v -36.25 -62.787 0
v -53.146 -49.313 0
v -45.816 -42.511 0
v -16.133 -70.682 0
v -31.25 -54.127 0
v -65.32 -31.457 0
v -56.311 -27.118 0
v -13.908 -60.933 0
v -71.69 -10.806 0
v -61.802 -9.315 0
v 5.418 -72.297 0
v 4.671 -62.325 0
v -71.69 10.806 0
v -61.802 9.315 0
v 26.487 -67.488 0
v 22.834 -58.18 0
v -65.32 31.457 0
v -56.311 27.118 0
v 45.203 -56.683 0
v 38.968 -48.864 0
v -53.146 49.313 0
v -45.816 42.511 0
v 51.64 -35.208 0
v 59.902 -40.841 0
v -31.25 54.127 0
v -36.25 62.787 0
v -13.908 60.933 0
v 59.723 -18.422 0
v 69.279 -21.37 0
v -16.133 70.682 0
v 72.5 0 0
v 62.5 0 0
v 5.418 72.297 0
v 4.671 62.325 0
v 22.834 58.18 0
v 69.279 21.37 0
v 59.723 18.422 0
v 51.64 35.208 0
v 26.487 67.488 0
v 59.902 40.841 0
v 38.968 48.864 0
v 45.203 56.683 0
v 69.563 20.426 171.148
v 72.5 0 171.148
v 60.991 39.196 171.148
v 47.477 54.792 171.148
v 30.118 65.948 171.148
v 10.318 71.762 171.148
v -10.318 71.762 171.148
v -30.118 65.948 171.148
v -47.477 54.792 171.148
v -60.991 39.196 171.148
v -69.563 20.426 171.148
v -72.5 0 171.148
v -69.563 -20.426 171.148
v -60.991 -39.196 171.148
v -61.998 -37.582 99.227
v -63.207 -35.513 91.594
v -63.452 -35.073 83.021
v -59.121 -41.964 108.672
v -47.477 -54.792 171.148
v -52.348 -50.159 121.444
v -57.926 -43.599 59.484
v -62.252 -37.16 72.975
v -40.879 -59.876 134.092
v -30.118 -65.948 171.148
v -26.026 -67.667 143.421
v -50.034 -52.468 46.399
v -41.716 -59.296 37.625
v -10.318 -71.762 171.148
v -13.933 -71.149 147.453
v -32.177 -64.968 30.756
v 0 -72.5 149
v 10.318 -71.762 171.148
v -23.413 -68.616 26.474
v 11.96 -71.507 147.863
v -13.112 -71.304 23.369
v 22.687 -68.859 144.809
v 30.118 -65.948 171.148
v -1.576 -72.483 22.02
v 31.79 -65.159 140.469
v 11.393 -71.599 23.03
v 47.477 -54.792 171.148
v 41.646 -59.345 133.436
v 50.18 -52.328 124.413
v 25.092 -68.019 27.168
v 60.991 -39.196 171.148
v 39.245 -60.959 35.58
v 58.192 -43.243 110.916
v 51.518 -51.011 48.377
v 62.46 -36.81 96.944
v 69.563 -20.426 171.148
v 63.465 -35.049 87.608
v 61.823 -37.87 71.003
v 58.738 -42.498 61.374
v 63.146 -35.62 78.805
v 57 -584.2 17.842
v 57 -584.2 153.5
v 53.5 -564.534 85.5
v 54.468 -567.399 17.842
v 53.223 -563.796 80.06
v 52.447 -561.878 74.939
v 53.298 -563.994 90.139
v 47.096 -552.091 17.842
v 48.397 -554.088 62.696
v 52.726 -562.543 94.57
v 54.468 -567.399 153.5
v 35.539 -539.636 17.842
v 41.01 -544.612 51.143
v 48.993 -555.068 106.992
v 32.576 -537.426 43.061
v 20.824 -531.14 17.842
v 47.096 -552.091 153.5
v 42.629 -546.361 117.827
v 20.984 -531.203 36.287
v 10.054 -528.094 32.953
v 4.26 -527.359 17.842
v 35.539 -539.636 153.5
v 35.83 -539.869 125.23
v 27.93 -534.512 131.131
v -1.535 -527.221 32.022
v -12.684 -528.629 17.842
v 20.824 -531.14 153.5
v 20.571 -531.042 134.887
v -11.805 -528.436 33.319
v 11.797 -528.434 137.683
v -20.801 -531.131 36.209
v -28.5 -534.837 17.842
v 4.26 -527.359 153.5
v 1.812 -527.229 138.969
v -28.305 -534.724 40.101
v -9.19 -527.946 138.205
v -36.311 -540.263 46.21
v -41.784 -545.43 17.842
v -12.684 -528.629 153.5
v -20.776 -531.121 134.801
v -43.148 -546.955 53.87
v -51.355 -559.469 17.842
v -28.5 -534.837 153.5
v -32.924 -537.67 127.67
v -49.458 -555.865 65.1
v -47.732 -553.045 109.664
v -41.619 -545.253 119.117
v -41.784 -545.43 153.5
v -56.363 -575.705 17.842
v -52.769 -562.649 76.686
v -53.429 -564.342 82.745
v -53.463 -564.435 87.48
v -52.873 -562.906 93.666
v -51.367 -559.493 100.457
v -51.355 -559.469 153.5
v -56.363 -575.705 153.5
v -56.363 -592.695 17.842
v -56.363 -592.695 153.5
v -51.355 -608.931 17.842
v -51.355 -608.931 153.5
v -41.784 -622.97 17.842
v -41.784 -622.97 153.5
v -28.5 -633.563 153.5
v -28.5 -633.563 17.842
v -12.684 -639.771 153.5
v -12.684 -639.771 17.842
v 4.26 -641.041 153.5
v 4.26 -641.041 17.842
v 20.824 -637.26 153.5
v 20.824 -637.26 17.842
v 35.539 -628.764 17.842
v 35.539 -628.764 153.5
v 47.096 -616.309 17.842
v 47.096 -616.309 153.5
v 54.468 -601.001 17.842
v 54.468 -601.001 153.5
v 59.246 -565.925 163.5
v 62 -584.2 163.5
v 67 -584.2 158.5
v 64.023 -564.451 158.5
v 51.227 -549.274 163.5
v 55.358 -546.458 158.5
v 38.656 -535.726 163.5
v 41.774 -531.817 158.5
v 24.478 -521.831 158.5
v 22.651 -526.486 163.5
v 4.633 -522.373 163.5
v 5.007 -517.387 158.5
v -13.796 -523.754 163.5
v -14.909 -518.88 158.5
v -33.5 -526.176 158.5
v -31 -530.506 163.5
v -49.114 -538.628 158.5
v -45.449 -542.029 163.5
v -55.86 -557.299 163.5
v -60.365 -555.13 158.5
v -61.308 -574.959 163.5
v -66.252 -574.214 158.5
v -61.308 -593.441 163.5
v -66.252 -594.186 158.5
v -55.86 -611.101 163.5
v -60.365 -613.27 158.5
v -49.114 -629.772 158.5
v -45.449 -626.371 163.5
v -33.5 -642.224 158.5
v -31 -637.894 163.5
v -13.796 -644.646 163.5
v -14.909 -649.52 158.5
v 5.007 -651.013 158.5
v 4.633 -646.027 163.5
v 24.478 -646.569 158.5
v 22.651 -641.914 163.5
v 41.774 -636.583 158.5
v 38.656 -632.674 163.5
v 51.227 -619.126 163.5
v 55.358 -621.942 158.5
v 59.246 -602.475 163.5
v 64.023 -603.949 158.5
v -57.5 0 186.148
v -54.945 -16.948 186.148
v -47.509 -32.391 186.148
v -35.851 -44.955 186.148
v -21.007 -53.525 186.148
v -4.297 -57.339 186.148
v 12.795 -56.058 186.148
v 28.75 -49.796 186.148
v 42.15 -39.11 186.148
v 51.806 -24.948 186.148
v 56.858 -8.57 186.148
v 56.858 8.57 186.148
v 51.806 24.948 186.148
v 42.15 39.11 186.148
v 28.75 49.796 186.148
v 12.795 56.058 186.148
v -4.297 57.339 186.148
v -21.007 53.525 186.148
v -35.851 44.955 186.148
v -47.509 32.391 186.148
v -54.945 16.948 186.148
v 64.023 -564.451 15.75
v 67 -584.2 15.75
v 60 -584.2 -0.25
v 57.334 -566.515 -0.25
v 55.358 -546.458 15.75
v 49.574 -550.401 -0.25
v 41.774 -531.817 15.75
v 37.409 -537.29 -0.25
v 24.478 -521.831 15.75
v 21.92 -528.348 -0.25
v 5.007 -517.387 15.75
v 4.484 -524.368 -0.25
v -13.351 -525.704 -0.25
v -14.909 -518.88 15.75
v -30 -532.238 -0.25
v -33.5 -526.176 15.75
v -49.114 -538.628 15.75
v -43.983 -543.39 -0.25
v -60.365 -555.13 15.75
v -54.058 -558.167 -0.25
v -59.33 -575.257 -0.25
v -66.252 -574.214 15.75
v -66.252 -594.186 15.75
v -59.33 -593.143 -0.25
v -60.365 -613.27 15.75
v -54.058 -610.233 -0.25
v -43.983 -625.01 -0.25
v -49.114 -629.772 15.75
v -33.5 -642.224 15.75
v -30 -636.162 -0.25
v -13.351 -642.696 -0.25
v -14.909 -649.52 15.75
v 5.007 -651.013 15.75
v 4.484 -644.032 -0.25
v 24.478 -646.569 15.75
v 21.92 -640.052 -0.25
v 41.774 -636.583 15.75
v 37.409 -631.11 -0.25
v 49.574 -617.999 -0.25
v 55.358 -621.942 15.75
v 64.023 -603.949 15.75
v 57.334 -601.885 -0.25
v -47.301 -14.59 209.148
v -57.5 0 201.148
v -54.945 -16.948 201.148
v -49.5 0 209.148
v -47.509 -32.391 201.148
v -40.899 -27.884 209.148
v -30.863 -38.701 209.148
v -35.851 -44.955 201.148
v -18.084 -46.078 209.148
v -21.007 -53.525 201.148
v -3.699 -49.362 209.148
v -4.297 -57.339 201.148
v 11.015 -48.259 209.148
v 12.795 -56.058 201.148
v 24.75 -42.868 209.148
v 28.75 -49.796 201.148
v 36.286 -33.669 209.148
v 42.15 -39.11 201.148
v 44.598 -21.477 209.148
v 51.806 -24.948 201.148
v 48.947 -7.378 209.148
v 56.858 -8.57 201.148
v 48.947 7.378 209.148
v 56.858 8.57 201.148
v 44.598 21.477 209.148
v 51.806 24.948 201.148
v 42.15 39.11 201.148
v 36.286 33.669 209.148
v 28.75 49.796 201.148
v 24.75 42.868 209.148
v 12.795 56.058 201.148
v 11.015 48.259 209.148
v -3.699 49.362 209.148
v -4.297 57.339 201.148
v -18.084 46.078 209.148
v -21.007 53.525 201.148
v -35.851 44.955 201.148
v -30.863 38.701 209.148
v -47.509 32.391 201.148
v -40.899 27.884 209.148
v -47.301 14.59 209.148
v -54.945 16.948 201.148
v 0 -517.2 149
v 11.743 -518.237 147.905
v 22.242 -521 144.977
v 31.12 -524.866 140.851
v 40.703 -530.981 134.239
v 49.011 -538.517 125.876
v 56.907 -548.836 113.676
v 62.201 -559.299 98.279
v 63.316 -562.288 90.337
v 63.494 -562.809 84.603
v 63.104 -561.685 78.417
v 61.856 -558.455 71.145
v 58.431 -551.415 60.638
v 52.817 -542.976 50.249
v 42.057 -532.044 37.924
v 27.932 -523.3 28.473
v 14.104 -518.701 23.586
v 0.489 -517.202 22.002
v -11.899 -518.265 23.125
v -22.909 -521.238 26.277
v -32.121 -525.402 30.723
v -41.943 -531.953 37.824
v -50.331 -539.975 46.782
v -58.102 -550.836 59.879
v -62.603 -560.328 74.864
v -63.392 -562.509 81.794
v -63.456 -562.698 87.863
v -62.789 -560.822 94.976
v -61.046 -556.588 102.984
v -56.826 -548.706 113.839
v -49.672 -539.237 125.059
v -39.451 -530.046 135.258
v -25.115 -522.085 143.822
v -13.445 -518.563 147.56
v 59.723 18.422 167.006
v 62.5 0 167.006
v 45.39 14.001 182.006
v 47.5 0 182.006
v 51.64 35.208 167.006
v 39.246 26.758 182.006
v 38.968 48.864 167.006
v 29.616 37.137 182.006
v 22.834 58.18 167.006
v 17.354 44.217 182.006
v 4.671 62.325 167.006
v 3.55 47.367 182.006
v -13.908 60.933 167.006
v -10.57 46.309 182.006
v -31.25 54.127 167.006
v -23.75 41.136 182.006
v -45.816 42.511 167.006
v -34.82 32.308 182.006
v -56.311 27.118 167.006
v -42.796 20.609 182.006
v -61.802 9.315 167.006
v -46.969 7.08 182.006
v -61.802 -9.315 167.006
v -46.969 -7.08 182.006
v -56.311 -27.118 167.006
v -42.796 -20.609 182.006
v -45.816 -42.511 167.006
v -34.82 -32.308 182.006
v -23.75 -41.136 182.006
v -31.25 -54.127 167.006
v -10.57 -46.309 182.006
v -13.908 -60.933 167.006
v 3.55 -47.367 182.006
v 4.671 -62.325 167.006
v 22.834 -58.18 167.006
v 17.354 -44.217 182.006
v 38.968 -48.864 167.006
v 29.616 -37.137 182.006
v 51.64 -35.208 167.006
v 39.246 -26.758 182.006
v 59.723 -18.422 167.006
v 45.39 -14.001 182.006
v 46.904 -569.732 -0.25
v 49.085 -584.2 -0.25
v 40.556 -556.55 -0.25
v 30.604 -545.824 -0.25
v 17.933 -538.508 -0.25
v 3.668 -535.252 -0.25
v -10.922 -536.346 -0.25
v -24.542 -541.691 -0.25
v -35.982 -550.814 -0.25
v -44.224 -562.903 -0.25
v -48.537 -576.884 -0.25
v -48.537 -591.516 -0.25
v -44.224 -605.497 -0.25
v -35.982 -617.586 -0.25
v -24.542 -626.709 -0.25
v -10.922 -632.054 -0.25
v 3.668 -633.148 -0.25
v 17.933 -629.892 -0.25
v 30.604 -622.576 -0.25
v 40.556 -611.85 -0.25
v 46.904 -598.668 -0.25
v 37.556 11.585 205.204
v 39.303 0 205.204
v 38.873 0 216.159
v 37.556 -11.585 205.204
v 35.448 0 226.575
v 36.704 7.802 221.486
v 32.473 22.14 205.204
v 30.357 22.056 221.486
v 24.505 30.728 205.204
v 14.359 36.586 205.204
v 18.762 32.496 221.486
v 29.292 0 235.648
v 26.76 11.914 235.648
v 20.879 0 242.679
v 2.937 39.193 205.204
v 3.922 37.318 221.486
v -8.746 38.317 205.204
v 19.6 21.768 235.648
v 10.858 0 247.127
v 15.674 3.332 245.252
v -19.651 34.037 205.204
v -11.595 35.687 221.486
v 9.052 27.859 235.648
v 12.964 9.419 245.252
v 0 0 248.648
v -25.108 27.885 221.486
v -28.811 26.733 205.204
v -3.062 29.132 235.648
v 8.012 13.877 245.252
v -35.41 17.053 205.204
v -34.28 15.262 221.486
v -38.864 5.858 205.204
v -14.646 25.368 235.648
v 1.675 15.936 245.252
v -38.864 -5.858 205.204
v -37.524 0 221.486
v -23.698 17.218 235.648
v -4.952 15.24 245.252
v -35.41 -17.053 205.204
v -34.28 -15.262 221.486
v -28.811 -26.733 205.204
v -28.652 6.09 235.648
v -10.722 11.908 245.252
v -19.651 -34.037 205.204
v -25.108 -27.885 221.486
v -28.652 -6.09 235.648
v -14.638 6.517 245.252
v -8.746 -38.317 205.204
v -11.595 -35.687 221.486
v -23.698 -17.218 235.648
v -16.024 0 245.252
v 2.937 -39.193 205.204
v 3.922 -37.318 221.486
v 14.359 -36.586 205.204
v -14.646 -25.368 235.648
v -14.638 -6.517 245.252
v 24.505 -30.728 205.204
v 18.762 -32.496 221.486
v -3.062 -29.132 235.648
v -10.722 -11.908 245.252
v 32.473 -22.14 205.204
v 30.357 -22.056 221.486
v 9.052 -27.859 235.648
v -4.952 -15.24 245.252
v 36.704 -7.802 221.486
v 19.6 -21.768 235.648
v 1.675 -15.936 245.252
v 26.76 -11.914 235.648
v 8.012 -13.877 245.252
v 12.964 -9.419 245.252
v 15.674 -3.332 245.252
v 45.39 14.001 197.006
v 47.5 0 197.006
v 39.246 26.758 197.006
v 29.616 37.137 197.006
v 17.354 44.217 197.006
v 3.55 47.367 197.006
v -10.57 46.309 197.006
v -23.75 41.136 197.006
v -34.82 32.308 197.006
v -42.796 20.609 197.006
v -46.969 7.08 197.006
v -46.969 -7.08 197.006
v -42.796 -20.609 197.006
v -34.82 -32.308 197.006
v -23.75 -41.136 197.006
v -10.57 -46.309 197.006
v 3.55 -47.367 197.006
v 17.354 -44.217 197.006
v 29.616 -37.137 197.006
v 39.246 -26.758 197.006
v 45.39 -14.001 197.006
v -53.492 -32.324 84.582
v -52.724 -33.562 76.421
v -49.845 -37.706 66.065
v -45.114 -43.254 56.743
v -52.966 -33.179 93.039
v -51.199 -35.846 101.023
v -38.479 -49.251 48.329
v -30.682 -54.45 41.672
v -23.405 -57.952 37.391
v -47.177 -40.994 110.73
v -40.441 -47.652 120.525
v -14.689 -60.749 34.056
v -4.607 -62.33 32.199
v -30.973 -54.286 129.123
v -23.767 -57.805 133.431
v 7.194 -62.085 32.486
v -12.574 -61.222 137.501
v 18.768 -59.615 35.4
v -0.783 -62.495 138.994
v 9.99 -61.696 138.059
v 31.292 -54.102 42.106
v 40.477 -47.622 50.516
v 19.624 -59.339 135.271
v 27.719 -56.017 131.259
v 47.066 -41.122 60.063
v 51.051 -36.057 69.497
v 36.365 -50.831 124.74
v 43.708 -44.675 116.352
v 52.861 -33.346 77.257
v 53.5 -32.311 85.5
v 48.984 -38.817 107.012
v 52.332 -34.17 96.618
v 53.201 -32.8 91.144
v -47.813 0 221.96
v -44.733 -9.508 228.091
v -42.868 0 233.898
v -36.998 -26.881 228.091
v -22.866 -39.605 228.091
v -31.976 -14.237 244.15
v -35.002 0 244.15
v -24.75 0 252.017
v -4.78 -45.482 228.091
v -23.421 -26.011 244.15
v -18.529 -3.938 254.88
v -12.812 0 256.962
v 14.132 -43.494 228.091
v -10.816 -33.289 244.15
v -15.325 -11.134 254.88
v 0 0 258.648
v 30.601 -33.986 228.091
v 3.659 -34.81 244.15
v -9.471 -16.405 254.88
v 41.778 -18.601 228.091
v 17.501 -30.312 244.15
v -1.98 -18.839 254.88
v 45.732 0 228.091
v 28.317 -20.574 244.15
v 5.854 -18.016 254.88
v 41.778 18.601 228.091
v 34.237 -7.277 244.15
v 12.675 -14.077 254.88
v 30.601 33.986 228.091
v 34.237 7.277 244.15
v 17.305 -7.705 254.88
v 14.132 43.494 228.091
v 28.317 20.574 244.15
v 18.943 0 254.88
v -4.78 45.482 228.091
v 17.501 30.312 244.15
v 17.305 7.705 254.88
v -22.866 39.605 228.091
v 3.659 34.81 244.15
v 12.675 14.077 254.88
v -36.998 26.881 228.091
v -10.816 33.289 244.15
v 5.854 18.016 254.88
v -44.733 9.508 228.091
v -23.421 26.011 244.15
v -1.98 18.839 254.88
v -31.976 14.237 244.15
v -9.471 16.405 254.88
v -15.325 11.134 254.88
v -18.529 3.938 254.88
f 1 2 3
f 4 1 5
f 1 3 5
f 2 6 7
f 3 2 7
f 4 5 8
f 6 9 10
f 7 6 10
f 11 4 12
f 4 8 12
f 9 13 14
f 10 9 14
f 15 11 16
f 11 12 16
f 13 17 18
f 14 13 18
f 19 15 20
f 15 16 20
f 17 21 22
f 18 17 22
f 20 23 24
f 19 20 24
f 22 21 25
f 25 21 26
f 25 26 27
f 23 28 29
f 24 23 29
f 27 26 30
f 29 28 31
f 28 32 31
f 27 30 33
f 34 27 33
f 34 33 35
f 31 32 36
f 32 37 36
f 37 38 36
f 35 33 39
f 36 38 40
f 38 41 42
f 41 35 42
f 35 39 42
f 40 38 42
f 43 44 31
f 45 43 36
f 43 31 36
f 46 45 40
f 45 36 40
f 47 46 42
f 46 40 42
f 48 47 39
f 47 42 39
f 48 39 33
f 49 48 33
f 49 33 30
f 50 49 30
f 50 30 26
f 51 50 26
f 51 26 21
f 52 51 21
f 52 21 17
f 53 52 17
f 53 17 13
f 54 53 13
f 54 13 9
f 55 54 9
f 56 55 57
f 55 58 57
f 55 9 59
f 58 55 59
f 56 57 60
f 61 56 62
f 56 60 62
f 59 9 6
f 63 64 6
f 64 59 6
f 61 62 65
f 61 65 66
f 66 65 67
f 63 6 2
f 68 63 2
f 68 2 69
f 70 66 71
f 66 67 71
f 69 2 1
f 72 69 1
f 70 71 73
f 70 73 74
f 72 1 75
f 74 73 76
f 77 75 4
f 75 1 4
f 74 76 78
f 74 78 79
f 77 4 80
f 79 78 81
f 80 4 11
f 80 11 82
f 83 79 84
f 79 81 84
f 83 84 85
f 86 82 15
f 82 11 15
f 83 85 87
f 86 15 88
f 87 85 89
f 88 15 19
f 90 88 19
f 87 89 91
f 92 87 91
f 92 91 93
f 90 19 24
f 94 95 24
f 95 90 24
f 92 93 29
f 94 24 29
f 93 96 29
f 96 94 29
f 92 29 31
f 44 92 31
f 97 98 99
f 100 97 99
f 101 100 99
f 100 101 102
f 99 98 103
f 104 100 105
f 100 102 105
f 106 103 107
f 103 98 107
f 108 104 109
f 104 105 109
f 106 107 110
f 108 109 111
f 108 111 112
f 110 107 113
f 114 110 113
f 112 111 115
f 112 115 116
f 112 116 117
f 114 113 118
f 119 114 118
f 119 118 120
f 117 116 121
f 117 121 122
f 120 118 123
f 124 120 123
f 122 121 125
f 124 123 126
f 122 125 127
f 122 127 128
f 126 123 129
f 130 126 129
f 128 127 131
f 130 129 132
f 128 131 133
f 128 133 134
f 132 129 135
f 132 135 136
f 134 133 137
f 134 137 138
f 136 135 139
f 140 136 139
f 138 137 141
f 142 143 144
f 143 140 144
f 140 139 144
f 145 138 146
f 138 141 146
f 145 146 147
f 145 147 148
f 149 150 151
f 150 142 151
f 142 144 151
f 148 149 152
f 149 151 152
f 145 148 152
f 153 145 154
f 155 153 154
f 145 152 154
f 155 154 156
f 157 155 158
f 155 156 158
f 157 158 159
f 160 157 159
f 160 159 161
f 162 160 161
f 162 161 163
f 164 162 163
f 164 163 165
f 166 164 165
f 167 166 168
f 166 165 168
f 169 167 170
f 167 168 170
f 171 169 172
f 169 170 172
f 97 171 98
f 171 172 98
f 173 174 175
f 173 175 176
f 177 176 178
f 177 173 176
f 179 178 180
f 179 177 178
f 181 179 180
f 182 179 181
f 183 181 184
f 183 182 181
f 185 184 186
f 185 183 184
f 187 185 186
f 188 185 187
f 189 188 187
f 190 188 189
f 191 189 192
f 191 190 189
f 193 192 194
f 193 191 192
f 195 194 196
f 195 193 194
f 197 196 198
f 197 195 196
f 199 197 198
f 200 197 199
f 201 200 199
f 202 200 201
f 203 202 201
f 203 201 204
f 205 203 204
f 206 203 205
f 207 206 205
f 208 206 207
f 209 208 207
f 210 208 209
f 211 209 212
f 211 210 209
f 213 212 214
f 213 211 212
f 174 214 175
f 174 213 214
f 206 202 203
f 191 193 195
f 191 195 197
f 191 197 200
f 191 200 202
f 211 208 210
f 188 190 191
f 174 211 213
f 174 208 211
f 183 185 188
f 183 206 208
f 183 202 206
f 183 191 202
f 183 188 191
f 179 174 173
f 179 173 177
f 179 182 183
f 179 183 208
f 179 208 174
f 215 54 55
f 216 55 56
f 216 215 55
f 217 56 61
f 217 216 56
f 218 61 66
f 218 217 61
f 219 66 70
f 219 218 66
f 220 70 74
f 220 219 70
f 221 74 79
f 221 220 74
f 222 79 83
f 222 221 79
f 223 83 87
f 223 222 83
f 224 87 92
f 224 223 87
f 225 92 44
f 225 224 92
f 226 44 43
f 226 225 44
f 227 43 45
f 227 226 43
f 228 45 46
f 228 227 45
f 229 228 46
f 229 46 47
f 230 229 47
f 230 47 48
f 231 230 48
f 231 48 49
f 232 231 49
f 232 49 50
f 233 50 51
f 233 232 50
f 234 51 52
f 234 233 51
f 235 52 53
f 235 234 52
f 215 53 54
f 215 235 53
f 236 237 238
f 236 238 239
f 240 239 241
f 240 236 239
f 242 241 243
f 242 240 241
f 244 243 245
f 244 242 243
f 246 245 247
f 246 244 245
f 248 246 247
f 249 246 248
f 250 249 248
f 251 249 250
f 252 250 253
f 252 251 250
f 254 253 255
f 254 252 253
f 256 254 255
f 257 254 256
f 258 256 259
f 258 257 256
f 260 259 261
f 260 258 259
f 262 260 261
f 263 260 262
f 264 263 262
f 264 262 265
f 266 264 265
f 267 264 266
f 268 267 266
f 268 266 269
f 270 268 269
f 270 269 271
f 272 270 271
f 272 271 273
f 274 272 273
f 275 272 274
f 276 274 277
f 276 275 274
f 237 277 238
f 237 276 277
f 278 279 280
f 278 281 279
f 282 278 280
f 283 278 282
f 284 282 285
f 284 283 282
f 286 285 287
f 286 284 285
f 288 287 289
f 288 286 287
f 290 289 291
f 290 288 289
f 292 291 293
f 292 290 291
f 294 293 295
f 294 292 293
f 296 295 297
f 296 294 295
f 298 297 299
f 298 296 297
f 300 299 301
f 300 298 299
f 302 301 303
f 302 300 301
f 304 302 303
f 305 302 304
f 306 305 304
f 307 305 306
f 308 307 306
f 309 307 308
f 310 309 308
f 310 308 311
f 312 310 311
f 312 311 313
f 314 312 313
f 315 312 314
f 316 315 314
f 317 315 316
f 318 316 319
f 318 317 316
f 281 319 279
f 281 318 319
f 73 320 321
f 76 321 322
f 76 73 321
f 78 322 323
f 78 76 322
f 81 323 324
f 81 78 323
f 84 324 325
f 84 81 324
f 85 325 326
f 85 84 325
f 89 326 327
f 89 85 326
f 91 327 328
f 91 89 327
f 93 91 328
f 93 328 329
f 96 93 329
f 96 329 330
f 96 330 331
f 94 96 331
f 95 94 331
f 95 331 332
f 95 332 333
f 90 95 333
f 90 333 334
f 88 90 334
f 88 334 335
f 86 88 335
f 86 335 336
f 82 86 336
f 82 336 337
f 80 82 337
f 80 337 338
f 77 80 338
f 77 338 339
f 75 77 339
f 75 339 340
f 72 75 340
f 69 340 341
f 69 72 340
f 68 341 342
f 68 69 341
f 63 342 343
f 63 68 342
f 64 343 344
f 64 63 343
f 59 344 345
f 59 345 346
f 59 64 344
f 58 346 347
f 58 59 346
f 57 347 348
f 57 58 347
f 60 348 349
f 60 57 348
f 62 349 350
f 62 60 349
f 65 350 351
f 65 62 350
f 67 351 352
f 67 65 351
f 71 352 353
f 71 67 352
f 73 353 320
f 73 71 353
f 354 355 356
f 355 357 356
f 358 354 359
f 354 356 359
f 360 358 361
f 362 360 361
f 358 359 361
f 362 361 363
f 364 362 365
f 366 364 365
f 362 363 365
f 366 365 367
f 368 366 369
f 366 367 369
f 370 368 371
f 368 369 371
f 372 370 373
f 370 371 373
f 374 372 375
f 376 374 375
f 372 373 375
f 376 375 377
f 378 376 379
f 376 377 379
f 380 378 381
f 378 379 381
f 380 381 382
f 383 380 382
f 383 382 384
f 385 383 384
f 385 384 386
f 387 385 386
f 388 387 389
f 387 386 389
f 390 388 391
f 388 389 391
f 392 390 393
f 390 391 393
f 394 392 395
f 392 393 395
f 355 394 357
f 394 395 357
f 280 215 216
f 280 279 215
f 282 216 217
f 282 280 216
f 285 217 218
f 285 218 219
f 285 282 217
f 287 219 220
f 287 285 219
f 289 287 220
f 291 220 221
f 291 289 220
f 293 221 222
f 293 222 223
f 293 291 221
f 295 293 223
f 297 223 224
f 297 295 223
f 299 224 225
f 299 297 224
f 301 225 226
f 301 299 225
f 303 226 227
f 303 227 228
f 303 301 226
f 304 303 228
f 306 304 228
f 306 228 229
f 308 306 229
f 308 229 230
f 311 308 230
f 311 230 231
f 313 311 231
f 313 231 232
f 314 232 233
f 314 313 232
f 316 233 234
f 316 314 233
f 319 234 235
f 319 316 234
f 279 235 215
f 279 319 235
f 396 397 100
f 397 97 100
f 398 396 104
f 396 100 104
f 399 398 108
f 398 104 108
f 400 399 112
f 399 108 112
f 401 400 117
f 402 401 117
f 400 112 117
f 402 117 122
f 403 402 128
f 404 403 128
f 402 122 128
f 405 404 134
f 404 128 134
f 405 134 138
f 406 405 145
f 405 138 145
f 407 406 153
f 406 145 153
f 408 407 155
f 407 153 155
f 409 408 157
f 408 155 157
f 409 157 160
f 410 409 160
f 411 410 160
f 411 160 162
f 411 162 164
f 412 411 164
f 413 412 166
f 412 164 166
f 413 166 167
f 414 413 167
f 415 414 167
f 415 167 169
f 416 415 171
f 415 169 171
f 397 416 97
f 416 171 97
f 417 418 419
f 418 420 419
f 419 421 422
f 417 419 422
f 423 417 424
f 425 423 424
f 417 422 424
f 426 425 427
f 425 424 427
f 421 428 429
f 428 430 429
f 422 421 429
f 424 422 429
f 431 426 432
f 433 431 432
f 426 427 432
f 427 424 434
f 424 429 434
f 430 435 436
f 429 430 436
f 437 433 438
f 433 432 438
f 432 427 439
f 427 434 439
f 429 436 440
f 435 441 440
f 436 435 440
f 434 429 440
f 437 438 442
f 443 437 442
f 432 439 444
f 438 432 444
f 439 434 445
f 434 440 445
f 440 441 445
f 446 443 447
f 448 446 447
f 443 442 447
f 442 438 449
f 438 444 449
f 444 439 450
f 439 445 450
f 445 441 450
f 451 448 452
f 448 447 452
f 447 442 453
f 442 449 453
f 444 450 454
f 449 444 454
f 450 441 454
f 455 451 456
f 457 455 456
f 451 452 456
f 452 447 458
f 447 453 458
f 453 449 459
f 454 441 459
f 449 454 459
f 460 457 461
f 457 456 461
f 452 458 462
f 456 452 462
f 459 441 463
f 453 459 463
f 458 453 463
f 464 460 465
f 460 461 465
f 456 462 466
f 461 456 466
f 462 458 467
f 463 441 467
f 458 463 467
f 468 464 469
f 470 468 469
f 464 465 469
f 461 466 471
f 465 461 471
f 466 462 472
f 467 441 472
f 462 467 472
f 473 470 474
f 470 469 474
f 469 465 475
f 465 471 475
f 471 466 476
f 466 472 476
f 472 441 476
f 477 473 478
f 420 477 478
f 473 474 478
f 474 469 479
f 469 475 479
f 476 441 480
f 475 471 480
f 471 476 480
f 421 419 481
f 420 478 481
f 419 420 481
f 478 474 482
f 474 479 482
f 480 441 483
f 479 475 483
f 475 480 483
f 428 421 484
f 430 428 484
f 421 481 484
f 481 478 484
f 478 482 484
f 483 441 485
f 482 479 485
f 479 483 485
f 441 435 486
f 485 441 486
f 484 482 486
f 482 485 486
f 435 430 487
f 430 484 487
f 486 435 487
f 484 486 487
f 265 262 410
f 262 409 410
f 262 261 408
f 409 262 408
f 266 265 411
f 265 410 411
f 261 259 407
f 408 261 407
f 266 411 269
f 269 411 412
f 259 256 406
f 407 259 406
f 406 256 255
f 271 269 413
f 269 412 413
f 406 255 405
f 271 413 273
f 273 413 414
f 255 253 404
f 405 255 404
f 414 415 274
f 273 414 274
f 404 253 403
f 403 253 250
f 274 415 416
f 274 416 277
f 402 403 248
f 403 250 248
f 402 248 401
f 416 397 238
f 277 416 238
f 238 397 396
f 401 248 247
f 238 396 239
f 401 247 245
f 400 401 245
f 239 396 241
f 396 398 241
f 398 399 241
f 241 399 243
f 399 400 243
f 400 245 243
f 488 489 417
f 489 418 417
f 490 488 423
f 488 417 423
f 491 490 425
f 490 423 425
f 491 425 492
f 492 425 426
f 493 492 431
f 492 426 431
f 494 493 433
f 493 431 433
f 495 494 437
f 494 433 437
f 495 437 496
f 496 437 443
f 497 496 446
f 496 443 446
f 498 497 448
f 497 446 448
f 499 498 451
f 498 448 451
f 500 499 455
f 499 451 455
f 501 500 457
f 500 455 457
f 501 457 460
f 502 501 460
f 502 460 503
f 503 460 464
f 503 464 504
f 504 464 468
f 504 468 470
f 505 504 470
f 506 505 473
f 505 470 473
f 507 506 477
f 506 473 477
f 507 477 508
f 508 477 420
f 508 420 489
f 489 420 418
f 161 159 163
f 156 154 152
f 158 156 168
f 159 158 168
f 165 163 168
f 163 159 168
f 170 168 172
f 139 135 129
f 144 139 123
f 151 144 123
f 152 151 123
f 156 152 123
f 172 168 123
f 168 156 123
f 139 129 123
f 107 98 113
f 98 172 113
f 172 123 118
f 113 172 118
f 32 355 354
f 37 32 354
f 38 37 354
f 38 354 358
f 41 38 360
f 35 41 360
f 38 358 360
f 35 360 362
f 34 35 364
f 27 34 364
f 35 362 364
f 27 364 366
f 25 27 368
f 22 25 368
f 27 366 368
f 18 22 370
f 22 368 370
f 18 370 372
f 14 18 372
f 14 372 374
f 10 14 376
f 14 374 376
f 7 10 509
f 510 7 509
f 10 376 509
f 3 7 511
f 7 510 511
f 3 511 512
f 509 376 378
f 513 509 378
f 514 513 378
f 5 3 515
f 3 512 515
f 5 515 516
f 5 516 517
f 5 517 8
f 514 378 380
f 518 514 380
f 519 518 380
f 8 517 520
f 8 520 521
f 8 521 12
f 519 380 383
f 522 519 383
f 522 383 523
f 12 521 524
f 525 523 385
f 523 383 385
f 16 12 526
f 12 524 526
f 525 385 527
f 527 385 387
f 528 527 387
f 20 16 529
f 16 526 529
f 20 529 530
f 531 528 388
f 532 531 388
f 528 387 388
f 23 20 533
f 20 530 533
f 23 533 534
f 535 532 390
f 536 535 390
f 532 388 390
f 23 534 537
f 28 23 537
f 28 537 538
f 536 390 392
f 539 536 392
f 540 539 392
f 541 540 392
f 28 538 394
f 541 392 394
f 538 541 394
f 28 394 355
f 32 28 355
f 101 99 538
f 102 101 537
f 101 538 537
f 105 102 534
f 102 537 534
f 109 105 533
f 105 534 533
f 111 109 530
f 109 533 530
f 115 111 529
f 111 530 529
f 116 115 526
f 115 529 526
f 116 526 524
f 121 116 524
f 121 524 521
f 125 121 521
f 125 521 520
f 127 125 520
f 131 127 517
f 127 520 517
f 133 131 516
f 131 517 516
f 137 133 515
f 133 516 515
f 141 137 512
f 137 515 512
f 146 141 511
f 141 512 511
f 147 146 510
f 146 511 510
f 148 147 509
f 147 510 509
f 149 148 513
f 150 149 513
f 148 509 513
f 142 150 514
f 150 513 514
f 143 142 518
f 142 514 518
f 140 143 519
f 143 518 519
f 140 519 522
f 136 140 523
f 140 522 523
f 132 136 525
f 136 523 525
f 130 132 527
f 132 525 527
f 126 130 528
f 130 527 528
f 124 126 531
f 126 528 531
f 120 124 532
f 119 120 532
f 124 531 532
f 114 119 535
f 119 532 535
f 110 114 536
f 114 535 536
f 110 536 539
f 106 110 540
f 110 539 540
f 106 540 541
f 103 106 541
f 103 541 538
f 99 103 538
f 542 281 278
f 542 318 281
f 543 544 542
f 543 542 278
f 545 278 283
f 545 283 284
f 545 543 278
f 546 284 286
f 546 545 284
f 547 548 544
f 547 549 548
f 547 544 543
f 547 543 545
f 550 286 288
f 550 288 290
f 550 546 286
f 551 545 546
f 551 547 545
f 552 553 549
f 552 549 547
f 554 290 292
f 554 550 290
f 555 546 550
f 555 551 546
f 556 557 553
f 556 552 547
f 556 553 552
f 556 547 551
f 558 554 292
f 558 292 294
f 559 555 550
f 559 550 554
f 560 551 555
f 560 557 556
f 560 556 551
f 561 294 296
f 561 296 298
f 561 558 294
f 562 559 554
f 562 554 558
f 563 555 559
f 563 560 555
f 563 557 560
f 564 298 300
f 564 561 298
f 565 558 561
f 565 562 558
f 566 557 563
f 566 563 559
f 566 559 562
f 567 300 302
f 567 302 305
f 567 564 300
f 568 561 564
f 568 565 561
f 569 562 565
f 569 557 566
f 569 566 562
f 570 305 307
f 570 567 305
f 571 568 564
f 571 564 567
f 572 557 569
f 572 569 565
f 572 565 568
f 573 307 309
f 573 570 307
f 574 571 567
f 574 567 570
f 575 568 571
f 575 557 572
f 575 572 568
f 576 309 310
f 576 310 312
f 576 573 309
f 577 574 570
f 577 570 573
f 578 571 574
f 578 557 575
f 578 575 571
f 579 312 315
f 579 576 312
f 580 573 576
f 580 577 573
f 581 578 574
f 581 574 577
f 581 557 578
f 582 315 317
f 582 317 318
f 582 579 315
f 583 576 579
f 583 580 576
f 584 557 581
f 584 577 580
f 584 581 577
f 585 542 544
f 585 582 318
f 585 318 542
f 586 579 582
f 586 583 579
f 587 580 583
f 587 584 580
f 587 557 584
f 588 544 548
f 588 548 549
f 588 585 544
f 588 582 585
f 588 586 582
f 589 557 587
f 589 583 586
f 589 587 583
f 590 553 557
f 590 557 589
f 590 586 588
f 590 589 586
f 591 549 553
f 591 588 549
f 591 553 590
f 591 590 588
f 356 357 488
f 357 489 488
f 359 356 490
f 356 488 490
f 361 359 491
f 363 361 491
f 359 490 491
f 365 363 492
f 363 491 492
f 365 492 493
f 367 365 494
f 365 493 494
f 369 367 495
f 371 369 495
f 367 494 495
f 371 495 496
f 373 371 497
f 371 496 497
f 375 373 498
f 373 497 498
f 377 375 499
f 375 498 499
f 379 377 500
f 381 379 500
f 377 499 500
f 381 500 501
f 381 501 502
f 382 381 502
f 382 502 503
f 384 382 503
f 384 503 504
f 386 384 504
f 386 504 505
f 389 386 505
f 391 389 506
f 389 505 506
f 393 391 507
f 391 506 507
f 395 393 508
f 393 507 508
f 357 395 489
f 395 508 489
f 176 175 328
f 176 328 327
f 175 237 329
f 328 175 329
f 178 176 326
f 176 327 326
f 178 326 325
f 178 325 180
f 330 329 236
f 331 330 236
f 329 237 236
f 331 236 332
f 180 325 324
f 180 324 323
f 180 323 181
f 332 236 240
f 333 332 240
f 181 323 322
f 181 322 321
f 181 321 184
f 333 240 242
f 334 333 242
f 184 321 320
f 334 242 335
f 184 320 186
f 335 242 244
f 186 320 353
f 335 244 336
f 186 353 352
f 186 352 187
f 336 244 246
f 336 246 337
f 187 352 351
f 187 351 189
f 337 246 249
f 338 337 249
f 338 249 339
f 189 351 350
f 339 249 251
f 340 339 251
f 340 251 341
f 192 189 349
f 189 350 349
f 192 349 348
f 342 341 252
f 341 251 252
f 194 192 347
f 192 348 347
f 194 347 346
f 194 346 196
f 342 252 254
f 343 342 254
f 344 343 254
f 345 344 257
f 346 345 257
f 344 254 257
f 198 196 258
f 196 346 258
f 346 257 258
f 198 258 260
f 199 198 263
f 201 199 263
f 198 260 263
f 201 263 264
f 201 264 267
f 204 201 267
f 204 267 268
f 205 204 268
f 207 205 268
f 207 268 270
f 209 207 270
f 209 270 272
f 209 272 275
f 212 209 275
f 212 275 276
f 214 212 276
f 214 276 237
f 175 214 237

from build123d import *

# Parameters (mm, degrees)
SKETCH1_R                = 72.5
BOSS_EXTRUDE1_DEPTH      = 294
FILLET1_R                = 72.5
SKETCH2_R                = 63.5
BOSS_EXTRUDE2_DEPTH      = 584.2
BOSS_EXTRUDE3_DEPTH      = 78
BOSS_EXTRUDE3_DEPTH_BACK = 85.75
SKETCH3_R                = 67
CHAMFER1_SIZE            = 5
CHAMFER2_SIZE            = 7
CHAMFER2_SIZE2           = 16
SHELL1_3_OUTLINE_W       = 53.5
SHELL1_3_OUTLINE_H       = 532.228338498


with BuildPart() as part:
    # Sketch1 → Boss-Extrude1 (new body)
    with BuildSketch(Plane.XY):
        Circle(SKETCH1_R)
    extrude(amount=BOSS_EXTRUDE1_DEPTH)

    # Fillet1
    fillet1_edges = [part.edges().sort_by_distance(p)[0] for p in [
        (-72.5, 0, 294),
    ]]
    fillet(fillet1_edges, radius=FILLET1_R)

    # Sketch2 → Boss-Extrude2 (add)
    with BuildSketch(Plane(origin=(0, 0, 0), x_dir=(1, 0, 0), z_dir=(0, 1, 0))):
        with Locations(Location((0, -85.5, 0), (0, 0, 270))):
            Circle(SKETCH2_R)
    extrude(amount=-BOSS_EXTRUDE2_DEPTH)

    # Sketch3 → Boss-Extrude3 (add, two sides: drawn at the far end of the back side and taken through both)
    with BuildSketch(Plane.XY.offset(85.5).offset(-BOSS_EXTRUDE3_DEPTH_BACK)):
        with Locations((0, -584.2)):
            Circle(SKETCH3_R)
    extrude(amount=BOSS_EXTRUDE3_DEPTH + BOSS_EXTRUDE3_DEPTH_BACK)

    # Chamfer1
    chamfer1_edges = [part.edges().sort_by_distance(p)[0] for p in [
        (-67, -584.2, 163.5),
    ]]
    chamfer(chamfer1_edges, length=CHAMFER1_SIZE)

    # Chamfer2
    chamfer2_edges = [part.edges().sort_by_distance(p)[0] for p in [
        (-67, -584.2, -0.25),
    ]]
    chamfer2_side = [part.faces().sort_by_distance(p)[0] for p in [
        (0, -584.2, -0.25),
    ]]
    chamfer(chamfer2_edges, length=CHAMFER2_SIZE, length2=CHAMFER2_SIZE2, reference=chamfer2_side[0])

    # Sketch4 → Cut-Revolve1 (revolve, cut)
    with BuildSketch(Plane(origin=(0, 0, 0), x_dir=(1, 0, 0), z_dir=(0, 1, 0)), mode=Mode.PRIVATE) as cut_revolve1_sk:
        with BuildLine():
            Line((81.109243283, -151.148251361), (72.5, -151.148251361))
            Line((72.5, -151.148251361), (72.5, -171.148251361))
            Line((72.5, -171.148251361), (57.5, -186.148251361))
            Line((57.5, -186.148251361), (57.5, -201.148251361))
            Line((57.5, -201.148251361), (49.5, -209.148251361))
            ThreePointArc((49.5, -209.148251361), (35.001785669, -244.15003703), (0, -258.648251361))
            Line((0, -258.648251361), (0, -319.881343941))
            Line((0, -319.881343941), (156.304849296, -319.881343941))
            Line((156.304849296, -319.881343941), (156.304849296, -151.148251361))
            Line((156.304849296, -151.148251361), (81.109243283, -151.148251361))
        make_face()
    revolve(cut_revolve1_sk.sketch.rotate(Axis((0, 0, 258.648251361), (0, 0, 1)), 180), axis=Axis((0, 0, 258.648251361), (0, 0, 1)), mode=Mode.SUBTRACT)

    # Shell1: read off the stored shape, not the designer's step
    # Shell1 outline → Shell1 (revolve, cut)
    with BuildSketch(Plane.XZ.offset(584.2)):
        Polygon((49.084844252, -0.25), (57, 17.841784567), (57, 153.5), (0, 153.5), (0, -0.25), align=None)
    revolve(axis=Axis((0, -584.2, 0), (0, 0, 1)), mode=Mode.SUBTRACT)

    # Shell1 2 outline → Shell1 2 (revolve, cut)
    with BuildSketch(Plane.XZ):
        with BuildLine():
            Line((62.5, 0), (62.5, 167.006115737))
            Line((62.5, 167.006115737), (47.5, 182.006115737))
            Line((47.5, 182.006115737), (47.5, 197.006115737))
            Line((47.5, 197.006115737), (39.302538652, 205.203577042))
            ThreePointArc((39.302538652, 205.203577042), (29.292188682, 235.647641584), (0, 248.648251361))
            Line((0, 248.648251361), (0, 0))
            Line((0, 0), (62.5, 0))
        make_face()
    revolve(axis=Axis((0, 0, 0), (0, 0, 1)), mode=Mode.SUBTRACT)

    # Shell1 3 outline → Shell1 3 (revolve, cut)
    with BuildSketch(Plane.XY.offset(85.5)):
        with Locations((26.75, -298.423797413)):
            Rectangle(SHELL1_3_OUTLINE_W, SHELL1_3_OUTLINE_H)
    revolve(axis=Axis((0, 0, 85.5), (0, 1, 0)), mode=Mode.SUBTRACT)


solid = part.part
